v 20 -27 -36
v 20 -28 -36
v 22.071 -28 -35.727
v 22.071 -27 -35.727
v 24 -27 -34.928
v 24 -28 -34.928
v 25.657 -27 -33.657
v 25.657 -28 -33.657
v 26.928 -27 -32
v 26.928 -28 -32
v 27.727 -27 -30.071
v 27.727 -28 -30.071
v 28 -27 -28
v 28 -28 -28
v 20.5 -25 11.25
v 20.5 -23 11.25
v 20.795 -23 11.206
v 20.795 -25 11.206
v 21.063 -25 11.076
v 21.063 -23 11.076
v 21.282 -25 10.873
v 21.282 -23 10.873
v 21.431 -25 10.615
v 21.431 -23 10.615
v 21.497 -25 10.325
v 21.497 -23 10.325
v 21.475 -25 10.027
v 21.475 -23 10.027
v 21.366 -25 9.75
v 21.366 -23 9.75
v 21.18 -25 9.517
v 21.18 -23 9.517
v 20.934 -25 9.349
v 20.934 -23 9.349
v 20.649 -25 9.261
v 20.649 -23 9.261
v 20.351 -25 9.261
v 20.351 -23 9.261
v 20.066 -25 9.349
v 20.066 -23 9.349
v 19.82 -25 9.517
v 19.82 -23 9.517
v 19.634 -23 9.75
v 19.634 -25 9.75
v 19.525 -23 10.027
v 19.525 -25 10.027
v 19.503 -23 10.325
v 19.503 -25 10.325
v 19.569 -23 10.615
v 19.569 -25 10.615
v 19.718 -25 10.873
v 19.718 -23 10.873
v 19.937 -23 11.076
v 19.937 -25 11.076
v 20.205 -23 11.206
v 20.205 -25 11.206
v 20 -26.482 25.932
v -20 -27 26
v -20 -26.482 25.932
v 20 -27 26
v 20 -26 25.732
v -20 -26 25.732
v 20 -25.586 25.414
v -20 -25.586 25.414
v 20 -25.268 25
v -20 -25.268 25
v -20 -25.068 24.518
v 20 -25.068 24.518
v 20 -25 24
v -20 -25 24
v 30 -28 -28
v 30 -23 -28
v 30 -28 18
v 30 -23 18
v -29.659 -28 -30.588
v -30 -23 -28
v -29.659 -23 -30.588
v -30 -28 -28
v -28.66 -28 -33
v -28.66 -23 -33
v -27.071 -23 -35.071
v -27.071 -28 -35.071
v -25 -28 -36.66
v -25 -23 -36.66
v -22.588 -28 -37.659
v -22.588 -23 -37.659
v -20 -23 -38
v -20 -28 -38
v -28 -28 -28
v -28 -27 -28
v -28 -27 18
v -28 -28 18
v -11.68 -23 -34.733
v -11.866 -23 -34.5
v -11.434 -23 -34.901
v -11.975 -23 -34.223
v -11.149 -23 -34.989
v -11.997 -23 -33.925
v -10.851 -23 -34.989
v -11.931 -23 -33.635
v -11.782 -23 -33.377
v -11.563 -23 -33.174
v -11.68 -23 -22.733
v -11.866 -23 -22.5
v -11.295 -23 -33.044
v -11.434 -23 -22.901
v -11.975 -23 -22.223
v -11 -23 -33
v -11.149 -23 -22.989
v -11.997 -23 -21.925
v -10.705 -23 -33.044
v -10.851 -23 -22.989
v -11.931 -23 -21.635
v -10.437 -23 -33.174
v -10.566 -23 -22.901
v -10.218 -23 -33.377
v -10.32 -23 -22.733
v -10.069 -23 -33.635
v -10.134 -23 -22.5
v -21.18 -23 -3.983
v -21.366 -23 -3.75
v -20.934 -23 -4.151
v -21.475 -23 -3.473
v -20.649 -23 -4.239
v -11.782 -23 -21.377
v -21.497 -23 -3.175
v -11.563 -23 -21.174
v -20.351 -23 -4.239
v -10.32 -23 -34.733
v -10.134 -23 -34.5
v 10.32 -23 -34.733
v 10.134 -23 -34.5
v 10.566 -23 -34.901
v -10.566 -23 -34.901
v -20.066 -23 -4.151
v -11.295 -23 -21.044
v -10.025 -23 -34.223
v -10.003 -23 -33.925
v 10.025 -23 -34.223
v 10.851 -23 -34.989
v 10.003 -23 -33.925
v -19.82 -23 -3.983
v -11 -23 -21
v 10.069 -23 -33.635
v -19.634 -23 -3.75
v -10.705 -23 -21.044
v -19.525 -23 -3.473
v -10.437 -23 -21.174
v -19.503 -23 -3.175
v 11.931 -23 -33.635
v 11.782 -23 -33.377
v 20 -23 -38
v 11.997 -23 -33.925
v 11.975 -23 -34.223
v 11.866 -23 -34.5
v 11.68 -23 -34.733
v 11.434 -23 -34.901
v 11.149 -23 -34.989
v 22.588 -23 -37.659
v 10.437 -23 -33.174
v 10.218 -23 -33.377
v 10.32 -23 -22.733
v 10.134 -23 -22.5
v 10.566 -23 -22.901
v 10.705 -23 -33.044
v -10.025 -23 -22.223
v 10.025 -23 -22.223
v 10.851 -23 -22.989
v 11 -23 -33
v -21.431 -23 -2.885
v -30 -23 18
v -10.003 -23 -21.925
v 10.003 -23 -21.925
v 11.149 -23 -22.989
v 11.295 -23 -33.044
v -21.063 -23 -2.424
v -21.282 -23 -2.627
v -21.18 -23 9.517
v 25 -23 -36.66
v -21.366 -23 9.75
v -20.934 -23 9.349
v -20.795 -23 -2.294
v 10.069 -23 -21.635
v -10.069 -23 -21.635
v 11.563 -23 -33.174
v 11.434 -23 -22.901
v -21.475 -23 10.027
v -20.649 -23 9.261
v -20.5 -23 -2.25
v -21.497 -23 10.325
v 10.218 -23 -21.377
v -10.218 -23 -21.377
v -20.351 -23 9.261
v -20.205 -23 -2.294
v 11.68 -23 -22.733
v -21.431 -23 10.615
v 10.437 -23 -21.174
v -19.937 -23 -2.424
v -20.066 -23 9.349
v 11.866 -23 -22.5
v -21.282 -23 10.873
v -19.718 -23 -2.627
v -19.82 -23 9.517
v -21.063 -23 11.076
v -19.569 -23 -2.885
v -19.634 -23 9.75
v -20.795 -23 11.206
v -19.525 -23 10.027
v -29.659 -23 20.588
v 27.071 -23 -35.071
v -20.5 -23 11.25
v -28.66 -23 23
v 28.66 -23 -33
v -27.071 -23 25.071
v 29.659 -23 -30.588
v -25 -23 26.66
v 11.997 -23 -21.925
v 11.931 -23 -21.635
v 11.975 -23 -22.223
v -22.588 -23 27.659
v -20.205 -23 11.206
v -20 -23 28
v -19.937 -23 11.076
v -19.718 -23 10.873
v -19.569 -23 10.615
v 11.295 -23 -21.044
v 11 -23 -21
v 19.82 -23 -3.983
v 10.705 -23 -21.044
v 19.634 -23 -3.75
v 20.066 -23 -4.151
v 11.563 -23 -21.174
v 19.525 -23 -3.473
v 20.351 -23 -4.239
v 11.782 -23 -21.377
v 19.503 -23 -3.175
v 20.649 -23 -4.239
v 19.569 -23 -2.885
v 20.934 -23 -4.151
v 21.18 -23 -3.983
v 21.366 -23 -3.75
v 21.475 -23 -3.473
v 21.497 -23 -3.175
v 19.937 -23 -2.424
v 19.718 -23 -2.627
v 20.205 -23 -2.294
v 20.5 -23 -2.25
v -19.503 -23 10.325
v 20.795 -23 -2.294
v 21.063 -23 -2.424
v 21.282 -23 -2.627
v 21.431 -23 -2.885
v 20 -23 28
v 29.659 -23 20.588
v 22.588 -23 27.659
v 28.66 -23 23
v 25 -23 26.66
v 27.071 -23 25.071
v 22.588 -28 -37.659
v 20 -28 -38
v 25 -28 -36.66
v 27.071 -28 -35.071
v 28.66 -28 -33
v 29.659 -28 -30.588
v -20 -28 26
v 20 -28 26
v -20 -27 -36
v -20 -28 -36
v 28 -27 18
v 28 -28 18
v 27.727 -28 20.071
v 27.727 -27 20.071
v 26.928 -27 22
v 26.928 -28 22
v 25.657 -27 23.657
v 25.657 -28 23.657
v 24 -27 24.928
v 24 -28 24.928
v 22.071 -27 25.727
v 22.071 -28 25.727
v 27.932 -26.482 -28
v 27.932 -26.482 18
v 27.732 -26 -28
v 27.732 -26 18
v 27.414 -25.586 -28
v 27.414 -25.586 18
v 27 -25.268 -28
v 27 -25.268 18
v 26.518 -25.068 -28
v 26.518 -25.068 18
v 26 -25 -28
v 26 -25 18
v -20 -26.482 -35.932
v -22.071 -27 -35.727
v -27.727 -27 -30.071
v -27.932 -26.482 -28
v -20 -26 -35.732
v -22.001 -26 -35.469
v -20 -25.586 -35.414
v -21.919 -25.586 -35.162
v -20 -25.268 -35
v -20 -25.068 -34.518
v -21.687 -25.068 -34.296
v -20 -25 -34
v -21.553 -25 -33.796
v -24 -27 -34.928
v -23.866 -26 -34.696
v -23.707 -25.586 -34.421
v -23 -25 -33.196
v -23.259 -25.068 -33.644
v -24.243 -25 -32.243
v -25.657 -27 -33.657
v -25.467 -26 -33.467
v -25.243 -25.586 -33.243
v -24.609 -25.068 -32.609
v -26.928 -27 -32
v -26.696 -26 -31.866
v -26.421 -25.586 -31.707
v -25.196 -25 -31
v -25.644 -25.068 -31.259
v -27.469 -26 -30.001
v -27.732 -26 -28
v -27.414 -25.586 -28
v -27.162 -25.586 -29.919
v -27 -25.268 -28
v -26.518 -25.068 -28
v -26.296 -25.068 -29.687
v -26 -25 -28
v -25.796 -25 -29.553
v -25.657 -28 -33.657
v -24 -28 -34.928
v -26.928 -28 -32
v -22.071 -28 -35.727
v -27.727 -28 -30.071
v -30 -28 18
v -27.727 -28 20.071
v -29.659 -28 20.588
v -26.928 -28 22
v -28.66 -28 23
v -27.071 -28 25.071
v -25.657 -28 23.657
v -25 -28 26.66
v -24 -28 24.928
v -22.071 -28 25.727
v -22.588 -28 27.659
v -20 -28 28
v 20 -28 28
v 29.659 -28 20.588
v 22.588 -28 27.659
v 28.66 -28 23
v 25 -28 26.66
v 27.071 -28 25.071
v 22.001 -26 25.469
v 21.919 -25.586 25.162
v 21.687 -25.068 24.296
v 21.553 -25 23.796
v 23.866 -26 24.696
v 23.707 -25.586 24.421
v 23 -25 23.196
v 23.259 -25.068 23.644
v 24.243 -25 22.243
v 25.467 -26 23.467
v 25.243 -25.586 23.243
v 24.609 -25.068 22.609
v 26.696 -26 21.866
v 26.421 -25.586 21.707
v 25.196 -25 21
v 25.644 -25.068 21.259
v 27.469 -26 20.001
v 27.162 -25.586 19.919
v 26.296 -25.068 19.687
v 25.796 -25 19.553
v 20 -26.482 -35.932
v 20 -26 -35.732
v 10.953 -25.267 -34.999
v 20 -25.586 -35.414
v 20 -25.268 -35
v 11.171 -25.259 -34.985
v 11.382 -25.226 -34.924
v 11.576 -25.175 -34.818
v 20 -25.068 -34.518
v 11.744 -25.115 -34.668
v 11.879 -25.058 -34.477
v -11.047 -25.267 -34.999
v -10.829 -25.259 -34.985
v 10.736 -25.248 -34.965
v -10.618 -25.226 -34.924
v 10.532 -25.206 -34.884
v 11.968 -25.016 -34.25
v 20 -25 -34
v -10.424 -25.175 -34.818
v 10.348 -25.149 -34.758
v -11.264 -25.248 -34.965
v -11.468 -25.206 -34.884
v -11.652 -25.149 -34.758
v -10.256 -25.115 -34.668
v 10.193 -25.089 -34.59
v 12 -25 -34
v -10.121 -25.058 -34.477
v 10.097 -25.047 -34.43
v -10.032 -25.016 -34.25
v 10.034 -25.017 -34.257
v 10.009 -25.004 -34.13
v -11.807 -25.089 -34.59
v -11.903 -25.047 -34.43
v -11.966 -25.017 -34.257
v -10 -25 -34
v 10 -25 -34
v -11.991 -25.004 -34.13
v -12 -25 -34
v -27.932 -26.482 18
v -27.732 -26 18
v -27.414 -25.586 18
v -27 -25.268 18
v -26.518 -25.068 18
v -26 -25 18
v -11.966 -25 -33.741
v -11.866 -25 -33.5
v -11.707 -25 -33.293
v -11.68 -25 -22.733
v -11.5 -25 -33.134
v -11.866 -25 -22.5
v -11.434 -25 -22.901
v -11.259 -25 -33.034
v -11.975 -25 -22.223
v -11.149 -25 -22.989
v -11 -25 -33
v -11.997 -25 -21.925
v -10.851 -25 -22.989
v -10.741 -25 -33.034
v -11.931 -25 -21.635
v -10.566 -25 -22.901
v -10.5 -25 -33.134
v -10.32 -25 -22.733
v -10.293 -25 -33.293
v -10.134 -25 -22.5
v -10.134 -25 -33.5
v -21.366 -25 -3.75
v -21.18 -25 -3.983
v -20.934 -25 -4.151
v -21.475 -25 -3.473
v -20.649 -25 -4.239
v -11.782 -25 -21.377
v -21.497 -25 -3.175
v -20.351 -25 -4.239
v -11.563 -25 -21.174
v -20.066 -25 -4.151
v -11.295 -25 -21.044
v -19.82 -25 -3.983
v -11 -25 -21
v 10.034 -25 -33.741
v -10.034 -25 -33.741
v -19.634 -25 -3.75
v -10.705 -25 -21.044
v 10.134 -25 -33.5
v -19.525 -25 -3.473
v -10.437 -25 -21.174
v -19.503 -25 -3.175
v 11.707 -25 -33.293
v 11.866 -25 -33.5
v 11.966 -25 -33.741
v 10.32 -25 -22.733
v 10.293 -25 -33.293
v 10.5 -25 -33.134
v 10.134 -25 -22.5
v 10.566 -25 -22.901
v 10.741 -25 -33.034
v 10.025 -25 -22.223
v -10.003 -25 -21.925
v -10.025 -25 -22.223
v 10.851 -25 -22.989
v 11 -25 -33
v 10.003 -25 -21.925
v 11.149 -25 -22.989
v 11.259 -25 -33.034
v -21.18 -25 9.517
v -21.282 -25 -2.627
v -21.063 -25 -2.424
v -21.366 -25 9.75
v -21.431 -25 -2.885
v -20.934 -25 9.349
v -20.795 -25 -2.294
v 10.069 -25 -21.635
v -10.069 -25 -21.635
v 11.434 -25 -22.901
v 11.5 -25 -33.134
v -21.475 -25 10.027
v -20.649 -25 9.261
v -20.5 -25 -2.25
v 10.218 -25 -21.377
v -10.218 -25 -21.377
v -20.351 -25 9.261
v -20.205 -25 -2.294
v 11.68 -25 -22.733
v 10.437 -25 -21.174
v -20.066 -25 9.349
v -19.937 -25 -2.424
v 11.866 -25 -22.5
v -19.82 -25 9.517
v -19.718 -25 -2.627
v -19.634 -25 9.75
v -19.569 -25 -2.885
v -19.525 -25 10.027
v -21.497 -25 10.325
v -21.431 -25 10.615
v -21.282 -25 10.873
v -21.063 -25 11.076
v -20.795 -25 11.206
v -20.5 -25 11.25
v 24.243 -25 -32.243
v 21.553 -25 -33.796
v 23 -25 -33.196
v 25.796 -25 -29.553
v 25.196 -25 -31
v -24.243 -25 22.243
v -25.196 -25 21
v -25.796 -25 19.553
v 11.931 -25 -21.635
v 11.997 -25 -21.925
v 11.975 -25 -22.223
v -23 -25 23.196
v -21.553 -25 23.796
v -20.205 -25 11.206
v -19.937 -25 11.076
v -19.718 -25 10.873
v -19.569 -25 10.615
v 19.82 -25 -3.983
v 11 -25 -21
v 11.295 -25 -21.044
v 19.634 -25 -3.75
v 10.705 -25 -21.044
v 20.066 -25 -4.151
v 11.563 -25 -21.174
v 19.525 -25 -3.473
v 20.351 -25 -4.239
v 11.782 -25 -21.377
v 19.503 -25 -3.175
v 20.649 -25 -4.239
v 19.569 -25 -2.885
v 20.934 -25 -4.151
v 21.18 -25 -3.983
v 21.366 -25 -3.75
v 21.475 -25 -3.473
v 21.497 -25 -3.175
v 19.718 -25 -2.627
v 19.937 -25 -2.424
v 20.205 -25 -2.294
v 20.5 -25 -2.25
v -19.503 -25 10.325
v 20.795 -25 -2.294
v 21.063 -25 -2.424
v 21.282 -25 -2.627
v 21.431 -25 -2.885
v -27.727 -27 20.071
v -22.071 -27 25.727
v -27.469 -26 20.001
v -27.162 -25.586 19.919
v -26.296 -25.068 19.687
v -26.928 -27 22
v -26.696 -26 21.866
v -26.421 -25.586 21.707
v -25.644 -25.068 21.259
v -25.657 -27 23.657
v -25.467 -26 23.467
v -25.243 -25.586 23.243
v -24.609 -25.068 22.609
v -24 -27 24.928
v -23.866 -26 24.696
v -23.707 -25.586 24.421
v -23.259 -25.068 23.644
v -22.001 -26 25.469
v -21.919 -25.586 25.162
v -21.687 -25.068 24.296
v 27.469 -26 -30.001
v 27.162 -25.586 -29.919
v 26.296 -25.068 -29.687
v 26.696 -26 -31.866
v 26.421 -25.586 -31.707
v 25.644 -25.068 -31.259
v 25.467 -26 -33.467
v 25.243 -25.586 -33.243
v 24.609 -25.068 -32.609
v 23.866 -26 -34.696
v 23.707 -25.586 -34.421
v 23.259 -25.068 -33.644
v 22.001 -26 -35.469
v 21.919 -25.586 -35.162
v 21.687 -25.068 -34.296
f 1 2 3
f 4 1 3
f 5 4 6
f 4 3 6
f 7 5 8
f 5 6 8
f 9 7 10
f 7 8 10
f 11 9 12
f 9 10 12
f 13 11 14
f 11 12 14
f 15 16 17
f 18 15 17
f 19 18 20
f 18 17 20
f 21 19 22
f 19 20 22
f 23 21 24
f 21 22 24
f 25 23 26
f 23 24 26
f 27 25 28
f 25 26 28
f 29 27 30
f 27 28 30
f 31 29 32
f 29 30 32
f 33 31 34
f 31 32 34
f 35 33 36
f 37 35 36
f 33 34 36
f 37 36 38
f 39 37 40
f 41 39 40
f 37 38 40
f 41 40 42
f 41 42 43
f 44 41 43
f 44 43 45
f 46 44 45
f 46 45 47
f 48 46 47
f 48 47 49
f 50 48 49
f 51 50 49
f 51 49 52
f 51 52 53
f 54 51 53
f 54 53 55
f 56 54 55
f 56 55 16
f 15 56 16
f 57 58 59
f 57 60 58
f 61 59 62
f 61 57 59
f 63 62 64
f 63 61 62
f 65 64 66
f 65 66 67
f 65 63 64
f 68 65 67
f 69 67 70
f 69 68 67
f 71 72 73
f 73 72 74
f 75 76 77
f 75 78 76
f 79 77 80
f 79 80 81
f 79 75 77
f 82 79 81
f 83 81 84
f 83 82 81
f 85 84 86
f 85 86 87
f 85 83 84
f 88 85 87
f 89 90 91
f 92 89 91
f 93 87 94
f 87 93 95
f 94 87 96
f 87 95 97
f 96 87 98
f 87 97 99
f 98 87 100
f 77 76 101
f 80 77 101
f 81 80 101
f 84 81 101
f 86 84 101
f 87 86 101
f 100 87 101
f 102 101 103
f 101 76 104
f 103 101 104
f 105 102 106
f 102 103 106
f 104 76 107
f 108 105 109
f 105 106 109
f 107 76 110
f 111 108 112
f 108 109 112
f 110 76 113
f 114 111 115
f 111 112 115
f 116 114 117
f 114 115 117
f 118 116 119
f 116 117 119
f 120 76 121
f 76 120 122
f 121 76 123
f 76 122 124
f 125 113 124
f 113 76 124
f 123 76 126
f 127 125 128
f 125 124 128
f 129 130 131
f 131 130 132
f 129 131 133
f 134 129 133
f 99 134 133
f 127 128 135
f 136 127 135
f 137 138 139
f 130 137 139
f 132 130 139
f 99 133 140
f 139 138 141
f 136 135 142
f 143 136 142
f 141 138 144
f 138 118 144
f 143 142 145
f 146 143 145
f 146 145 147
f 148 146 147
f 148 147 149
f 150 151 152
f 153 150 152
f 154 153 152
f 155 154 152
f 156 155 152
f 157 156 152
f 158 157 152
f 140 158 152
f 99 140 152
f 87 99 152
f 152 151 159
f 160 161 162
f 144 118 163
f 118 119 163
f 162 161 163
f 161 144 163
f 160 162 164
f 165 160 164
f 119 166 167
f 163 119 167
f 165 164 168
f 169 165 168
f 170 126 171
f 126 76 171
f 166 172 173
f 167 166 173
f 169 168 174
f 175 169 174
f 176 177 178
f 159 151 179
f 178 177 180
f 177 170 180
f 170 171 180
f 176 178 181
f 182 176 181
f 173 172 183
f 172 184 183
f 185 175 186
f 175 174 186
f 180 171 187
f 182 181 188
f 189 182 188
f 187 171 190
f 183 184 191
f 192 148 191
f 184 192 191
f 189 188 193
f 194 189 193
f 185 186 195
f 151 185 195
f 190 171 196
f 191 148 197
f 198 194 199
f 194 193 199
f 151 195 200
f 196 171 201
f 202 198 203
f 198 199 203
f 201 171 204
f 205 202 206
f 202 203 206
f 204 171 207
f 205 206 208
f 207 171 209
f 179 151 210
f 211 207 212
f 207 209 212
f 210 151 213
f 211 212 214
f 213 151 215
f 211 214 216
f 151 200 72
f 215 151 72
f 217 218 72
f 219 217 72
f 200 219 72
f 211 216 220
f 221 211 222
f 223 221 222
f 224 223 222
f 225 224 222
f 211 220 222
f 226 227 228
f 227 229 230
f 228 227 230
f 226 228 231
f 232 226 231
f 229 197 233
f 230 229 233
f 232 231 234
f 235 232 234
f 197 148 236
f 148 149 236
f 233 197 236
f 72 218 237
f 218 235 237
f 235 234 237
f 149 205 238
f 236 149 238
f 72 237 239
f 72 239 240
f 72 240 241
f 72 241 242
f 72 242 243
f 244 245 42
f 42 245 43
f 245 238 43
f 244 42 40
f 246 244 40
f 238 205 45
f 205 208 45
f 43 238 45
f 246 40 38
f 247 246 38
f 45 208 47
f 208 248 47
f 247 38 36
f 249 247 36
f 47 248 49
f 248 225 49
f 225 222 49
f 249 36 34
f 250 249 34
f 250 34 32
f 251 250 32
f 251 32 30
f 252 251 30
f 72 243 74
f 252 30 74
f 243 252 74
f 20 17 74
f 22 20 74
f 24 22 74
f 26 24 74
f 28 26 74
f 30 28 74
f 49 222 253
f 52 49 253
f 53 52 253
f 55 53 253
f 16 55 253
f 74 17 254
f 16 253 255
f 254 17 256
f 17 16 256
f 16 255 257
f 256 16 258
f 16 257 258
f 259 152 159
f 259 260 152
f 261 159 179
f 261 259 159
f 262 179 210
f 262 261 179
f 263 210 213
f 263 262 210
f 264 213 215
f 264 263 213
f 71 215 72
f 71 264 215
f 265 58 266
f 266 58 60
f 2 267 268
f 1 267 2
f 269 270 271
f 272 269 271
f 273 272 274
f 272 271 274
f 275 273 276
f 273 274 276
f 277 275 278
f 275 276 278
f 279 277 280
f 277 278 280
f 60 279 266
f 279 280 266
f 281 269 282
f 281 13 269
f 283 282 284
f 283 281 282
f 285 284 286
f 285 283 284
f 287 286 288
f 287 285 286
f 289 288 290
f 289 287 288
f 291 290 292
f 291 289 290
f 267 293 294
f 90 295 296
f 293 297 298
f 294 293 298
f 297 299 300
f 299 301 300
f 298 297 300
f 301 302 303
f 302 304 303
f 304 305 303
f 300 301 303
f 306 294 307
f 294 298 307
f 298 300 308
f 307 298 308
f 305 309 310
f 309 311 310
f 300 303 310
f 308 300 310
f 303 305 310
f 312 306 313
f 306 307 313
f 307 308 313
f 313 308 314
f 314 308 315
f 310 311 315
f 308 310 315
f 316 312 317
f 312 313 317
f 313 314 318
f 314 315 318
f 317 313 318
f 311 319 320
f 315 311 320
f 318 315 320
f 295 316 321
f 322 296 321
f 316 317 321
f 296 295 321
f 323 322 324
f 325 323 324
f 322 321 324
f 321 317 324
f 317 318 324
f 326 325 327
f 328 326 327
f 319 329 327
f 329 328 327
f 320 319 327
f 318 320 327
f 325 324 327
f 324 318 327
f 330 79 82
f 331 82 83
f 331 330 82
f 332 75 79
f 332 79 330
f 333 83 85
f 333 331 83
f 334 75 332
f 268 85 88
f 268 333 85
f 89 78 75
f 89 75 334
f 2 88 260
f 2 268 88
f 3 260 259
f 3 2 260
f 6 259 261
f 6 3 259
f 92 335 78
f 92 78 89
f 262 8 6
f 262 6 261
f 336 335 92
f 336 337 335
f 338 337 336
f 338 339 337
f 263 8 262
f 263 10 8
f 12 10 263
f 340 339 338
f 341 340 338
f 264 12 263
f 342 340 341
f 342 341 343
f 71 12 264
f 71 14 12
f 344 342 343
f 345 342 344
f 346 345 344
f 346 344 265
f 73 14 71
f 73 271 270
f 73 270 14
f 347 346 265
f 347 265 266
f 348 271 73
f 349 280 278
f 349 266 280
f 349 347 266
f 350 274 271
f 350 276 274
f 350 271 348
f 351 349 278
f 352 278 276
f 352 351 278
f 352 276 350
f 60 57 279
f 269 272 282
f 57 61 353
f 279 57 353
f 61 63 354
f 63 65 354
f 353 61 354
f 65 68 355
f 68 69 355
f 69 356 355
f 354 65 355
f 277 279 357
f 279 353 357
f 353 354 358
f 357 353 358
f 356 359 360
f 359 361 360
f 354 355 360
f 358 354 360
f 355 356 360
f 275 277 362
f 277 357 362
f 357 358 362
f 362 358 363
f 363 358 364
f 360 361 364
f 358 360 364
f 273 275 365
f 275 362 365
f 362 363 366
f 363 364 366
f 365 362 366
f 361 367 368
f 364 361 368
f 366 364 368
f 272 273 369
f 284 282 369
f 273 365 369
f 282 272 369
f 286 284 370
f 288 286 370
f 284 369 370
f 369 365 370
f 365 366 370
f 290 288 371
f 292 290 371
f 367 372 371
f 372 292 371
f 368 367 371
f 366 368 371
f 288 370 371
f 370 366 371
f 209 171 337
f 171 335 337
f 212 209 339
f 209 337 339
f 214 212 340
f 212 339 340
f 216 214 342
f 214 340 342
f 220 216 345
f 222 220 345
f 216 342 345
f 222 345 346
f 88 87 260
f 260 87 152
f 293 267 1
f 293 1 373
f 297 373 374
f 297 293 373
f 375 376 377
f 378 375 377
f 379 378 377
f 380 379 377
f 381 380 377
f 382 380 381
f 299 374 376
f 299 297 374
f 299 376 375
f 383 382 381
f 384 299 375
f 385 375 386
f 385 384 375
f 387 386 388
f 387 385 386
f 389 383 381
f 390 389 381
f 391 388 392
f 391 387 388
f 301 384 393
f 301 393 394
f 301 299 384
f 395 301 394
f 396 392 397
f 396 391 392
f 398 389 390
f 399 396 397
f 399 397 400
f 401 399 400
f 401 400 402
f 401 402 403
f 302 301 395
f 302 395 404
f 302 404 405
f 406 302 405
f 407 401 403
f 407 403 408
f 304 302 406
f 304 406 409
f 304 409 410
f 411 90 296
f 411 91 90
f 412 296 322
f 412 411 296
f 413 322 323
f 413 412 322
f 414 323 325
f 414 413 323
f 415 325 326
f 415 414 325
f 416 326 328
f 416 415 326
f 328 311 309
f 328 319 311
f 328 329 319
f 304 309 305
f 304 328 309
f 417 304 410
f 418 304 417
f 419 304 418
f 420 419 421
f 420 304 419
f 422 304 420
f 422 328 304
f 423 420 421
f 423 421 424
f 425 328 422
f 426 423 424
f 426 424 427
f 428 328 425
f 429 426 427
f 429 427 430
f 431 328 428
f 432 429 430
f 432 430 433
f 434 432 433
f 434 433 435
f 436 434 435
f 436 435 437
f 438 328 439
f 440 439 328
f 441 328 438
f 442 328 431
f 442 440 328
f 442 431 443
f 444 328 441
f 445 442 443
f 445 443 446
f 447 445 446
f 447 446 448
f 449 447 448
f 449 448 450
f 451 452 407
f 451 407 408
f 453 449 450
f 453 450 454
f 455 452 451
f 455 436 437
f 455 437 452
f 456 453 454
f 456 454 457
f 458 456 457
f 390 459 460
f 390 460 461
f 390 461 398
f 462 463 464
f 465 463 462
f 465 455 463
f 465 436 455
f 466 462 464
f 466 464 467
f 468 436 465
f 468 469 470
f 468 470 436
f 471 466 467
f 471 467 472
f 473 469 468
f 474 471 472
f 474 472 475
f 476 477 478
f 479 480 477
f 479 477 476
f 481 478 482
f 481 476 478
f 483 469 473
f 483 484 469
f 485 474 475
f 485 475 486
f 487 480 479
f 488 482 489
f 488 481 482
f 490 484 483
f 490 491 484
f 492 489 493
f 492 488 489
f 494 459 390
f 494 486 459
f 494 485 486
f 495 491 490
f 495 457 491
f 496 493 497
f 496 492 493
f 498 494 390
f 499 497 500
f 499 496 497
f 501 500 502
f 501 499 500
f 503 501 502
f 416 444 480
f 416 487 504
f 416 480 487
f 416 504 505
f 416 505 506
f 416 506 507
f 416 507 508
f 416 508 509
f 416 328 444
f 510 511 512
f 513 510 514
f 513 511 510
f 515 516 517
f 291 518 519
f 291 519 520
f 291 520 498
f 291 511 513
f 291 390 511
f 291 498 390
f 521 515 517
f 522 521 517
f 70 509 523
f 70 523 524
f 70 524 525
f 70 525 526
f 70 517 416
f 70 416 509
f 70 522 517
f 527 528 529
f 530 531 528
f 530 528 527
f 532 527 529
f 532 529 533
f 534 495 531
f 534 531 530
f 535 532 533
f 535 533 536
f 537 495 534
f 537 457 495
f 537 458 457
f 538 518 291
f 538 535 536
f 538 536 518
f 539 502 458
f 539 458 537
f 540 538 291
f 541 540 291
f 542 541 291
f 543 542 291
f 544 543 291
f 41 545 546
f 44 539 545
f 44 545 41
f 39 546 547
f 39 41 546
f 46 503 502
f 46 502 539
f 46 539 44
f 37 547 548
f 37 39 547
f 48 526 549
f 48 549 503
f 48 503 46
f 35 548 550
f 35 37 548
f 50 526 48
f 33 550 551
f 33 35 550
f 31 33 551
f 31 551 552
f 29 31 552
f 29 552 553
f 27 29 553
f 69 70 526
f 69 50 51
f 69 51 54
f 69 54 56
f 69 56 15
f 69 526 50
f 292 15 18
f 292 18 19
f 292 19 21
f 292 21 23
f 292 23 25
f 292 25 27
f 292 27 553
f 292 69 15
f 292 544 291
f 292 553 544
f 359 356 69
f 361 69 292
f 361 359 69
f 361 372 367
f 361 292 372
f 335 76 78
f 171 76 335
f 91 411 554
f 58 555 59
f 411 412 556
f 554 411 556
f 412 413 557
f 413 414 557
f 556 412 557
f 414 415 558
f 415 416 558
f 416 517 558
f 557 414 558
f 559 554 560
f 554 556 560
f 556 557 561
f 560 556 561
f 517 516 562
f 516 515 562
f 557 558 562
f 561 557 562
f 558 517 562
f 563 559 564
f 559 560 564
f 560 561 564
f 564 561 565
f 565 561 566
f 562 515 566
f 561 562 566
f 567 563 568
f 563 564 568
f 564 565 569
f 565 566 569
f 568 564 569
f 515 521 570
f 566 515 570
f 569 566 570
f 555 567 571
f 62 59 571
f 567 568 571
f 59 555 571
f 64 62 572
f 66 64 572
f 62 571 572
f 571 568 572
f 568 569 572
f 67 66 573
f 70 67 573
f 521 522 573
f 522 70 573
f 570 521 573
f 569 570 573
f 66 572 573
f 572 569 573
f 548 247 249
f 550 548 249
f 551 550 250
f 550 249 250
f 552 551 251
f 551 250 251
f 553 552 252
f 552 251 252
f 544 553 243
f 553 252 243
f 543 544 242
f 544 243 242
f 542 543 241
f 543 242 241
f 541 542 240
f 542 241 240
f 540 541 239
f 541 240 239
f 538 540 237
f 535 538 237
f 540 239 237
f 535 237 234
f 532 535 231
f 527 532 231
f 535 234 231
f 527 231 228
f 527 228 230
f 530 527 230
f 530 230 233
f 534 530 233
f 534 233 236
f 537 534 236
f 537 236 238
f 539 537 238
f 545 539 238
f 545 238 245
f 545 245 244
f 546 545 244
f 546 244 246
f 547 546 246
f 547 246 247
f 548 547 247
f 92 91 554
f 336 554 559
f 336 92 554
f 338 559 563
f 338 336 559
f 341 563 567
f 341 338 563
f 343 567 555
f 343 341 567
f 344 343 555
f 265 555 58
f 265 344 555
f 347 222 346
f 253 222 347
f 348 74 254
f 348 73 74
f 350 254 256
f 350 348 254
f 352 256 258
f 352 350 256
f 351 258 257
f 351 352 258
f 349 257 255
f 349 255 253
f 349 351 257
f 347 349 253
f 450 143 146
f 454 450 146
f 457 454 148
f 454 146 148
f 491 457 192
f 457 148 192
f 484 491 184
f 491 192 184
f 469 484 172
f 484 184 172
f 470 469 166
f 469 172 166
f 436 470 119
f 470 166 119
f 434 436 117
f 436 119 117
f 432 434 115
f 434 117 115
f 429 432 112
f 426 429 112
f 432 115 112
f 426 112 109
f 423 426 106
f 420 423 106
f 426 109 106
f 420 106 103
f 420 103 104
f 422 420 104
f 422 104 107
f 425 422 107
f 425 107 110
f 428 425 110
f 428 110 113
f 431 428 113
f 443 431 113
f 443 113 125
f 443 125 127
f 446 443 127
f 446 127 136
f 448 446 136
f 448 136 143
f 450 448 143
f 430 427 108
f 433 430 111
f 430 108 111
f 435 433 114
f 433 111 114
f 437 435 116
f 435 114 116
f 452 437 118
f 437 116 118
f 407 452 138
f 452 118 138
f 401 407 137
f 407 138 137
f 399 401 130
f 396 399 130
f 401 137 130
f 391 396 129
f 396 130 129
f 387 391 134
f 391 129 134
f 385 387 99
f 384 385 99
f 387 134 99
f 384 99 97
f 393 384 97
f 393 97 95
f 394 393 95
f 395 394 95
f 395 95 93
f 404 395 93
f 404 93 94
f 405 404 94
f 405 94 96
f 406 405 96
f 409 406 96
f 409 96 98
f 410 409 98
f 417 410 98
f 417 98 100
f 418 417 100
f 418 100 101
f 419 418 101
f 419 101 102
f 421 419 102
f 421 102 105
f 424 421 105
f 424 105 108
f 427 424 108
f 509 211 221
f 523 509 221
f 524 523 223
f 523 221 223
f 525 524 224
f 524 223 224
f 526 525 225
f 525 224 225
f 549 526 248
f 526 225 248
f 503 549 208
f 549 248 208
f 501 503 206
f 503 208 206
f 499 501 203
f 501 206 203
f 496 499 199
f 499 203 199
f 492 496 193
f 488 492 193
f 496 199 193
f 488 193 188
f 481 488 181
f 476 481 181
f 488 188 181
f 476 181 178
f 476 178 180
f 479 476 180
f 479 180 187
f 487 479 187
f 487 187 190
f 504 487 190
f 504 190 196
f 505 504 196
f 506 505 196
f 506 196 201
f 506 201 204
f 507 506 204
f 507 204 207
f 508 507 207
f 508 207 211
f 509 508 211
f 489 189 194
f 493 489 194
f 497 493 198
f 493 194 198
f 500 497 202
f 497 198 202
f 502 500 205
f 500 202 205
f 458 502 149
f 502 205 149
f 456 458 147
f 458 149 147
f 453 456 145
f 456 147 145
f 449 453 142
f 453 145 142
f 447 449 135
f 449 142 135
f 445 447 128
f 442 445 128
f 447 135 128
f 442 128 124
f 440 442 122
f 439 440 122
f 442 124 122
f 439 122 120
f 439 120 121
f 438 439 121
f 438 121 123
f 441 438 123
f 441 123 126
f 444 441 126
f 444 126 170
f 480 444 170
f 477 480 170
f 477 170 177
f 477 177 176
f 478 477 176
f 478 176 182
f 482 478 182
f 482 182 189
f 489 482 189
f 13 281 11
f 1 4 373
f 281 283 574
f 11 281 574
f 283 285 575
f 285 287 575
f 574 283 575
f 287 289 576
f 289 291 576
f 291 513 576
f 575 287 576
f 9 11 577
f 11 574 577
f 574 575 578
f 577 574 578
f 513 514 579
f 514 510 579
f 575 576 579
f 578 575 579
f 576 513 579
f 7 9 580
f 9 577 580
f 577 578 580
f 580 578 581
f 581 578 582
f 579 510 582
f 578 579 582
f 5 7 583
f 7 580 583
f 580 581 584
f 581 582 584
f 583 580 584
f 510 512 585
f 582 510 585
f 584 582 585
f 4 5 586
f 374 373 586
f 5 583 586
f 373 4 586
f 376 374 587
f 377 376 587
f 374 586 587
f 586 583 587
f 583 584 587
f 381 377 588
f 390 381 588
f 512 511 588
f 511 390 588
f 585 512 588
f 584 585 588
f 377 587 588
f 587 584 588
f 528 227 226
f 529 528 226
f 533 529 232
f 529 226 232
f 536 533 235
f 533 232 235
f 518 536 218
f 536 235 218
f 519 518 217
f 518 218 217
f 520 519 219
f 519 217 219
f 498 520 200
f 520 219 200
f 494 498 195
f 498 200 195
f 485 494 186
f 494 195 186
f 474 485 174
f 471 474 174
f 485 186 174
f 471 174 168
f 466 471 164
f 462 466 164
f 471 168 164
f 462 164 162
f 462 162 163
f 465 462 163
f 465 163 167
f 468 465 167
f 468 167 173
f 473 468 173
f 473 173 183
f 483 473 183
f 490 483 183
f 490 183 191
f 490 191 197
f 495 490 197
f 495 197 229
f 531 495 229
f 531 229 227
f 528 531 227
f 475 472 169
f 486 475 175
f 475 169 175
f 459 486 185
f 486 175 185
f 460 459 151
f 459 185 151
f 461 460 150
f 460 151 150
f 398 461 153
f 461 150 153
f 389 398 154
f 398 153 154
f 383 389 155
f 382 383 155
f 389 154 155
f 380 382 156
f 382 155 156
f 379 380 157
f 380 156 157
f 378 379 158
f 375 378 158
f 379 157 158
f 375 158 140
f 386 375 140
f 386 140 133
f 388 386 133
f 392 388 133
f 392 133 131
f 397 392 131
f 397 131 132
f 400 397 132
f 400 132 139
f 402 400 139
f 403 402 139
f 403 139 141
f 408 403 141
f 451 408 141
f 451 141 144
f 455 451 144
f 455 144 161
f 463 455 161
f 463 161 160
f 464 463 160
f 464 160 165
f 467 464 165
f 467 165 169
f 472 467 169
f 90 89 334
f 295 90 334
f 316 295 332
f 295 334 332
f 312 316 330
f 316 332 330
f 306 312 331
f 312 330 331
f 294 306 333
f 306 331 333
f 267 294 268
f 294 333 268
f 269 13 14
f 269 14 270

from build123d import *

# Parameters (mm, degrees)
SKETCH1_W           = 60
SKETCH1_H           = 66
BOSS_EXTRUDE1_DEPTH = 5
FILLET1_R           = 10
SHELL1_T            = -2
FILLET2_R           = 2
SKETCH3_R           = 1
CUT_EXTRUDE1_DEPTH  = 5


with BuildPart() as part:
    # Sketch1 → Boss-Extrude1 (new body)
    with BuildSketch(Plane.XZ.offset(23)):
        with Locations((0, -5)):
            Rectangle(SKETCH1_W, SKETCH1_H)
    extrude(amount=BOSS_EXTRUDE1_DEPTH)

    # Fillet1
    fillet1_edges = [part.edges().sort_by_distance(p)[0] for p in [
        (-30, -25.5, 28),
        (30, -25.5, 28),
        (30, -25.5, -38),
        (-30, -25.5, -38),
    ]]
    fillet(fillet1_edges, radius=FILLET1_R)

    # Shell1
    shell1_openings = [part.faces().sort_by_distance(p)[0] for p in [
        (0, -28, -5),
    ]]
    offset(amount=SHELL1_T, openings=shell1_openings, kind=Kind.INTERSECTION)

    # Fillet2
    fillet2_edges = [part.edges().sort_by_distance(p)[0] for p in [
        (-28, -25, -5),
        (0, -25, -36),
        (28, -25, -5),
        (0, -25, 26),
        (25.656854249, -25, -33.656854249),
        (-25.656854249, -25, -33.656854249),
        (-25.656854249, -25, 23.656854249),
        (25.656854249, -25, 23.656854249),
    ]]
    fillet(fillet2_edges, radius=FILLET2_R)

    # Sketch3 → Cut-Extrude1 (cut)
    with BuildSketch(Plane(origin=(0, -23, 0), x_dir=(1, 0, 0), z_dir=(0, 1, 0))):
        with Locations(Location((20.5, 3.25, 0), (0, 0, 270))):
            Circle(SKETCH3_R)
        with Locations(Location((20.5, -10.25, 0), (0, 0, 270))):
            Circle(SKETCH3_R)
        with Locations(Location((11, 34, 0), (0, 0, 270))):
            Circle(SKETCH3_R)
        with Locations(Location((11, 22, 0), (0, 0, 270))):
            Circle(SKETCH3_R)
        with Locations(Location((-11, 34, 0), (0, 0, 270))):
            Circle(SKETCH3_R)
        with Locations(Location((-11, 22, 0), (0, 0, 270))):
            Circle(SKETCH3_R)
        with Locations(Location((-20.5, 3.25, 0), (0, 0, 270))):
            Circle(SKETCH3_R)
        with Locations(Location((-20.5, -10.25, 0), (0, 0, 270))):
            Circle(SKETCH3_R)
    extrude(amount=-CUT_EXTRUDE1_DEPTH, mode=Mode.SUBTRACT)


solid = part.part
